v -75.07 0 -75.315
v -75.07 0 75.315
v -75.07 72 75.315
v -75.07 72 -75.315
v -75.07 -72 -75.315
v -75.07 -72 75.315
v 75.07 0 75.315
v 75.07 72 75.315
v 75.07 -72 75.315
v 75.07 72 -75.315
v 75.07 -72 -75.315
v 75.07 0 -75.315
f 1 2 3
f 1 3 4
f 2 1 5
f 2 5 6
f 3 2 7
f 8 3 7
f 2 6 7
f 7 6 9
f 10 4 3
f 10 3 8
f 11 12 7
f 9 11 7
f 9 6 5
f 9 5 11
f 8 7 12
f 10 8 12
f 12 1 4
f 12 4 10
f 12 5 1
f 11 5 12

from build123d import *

# Parameters (mm, degrees)
F0_W      = 11.530376
F0_H      = 19.135508
F1_DEPTH  = 25
F2_W      = 150.140189
F2_H      = 150.630846
F3_DEPTH  = 72
F3_FACE_W = 150.140188
F3_FACE_H = 150.630846
F4_DEPTH  = 72


with BuildPart() as f1:
    # F0 (on Front) → F1 (new body)
    with BuildSketch(Plane.XZ):
        with Locations((-0.122664, -65.257011)):
            Rectangle(F0_W, F0_H)
    extrude(amount=F1_DEPTH)

    # F2 (on Front) → F3 (join)
    with BuildSketch(Plane.XZ):
        with Locations((-4e-06, 0)):
            Rectangle(F2_W, F2_H)
    extrude(amount=F3_DEPTH)

    # F3_face (on face) → F4 (join)
    with BuildSketch(Plane(origin=(-4e-06, 0, 0), x_dir=(1, 0, 0), z_dir=(0, 1, 0))):
        Rectangle(F3_FACE_W, F3_FACE_H)
    extrude(amount=F4_DEPTH)


solid = f1.part
